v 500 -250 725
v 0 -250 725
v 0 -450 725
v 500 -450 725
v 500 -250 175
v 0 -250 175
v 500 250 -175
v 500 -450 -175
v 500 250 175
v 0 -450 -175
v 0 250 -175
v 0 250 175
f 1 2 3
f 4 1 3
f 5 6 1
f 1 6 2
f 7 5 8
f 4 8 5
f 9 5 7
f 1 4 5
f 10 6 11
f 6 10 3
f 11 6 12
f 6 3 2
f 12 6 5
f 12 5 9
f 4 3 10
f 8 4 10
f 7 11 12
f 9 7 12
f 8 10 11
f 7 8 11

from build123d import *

# Parameters (mm, degrees)
F0_W     = 500
F0_H     = 350
F1_DEPTH = 500


with BuildPart() as f1:
    # F0 (on Right) → F1 (new body)
    with BuildSketch(Plane.YZ):
        Rectangle(F0_W, F0_H)
        Polygon((-450, -175), (-250, -175), (-250, 175), (-250, 725), (-450, 725), align=None)
    extrude(amount=F1_DEPTH)


solid = f1.part
